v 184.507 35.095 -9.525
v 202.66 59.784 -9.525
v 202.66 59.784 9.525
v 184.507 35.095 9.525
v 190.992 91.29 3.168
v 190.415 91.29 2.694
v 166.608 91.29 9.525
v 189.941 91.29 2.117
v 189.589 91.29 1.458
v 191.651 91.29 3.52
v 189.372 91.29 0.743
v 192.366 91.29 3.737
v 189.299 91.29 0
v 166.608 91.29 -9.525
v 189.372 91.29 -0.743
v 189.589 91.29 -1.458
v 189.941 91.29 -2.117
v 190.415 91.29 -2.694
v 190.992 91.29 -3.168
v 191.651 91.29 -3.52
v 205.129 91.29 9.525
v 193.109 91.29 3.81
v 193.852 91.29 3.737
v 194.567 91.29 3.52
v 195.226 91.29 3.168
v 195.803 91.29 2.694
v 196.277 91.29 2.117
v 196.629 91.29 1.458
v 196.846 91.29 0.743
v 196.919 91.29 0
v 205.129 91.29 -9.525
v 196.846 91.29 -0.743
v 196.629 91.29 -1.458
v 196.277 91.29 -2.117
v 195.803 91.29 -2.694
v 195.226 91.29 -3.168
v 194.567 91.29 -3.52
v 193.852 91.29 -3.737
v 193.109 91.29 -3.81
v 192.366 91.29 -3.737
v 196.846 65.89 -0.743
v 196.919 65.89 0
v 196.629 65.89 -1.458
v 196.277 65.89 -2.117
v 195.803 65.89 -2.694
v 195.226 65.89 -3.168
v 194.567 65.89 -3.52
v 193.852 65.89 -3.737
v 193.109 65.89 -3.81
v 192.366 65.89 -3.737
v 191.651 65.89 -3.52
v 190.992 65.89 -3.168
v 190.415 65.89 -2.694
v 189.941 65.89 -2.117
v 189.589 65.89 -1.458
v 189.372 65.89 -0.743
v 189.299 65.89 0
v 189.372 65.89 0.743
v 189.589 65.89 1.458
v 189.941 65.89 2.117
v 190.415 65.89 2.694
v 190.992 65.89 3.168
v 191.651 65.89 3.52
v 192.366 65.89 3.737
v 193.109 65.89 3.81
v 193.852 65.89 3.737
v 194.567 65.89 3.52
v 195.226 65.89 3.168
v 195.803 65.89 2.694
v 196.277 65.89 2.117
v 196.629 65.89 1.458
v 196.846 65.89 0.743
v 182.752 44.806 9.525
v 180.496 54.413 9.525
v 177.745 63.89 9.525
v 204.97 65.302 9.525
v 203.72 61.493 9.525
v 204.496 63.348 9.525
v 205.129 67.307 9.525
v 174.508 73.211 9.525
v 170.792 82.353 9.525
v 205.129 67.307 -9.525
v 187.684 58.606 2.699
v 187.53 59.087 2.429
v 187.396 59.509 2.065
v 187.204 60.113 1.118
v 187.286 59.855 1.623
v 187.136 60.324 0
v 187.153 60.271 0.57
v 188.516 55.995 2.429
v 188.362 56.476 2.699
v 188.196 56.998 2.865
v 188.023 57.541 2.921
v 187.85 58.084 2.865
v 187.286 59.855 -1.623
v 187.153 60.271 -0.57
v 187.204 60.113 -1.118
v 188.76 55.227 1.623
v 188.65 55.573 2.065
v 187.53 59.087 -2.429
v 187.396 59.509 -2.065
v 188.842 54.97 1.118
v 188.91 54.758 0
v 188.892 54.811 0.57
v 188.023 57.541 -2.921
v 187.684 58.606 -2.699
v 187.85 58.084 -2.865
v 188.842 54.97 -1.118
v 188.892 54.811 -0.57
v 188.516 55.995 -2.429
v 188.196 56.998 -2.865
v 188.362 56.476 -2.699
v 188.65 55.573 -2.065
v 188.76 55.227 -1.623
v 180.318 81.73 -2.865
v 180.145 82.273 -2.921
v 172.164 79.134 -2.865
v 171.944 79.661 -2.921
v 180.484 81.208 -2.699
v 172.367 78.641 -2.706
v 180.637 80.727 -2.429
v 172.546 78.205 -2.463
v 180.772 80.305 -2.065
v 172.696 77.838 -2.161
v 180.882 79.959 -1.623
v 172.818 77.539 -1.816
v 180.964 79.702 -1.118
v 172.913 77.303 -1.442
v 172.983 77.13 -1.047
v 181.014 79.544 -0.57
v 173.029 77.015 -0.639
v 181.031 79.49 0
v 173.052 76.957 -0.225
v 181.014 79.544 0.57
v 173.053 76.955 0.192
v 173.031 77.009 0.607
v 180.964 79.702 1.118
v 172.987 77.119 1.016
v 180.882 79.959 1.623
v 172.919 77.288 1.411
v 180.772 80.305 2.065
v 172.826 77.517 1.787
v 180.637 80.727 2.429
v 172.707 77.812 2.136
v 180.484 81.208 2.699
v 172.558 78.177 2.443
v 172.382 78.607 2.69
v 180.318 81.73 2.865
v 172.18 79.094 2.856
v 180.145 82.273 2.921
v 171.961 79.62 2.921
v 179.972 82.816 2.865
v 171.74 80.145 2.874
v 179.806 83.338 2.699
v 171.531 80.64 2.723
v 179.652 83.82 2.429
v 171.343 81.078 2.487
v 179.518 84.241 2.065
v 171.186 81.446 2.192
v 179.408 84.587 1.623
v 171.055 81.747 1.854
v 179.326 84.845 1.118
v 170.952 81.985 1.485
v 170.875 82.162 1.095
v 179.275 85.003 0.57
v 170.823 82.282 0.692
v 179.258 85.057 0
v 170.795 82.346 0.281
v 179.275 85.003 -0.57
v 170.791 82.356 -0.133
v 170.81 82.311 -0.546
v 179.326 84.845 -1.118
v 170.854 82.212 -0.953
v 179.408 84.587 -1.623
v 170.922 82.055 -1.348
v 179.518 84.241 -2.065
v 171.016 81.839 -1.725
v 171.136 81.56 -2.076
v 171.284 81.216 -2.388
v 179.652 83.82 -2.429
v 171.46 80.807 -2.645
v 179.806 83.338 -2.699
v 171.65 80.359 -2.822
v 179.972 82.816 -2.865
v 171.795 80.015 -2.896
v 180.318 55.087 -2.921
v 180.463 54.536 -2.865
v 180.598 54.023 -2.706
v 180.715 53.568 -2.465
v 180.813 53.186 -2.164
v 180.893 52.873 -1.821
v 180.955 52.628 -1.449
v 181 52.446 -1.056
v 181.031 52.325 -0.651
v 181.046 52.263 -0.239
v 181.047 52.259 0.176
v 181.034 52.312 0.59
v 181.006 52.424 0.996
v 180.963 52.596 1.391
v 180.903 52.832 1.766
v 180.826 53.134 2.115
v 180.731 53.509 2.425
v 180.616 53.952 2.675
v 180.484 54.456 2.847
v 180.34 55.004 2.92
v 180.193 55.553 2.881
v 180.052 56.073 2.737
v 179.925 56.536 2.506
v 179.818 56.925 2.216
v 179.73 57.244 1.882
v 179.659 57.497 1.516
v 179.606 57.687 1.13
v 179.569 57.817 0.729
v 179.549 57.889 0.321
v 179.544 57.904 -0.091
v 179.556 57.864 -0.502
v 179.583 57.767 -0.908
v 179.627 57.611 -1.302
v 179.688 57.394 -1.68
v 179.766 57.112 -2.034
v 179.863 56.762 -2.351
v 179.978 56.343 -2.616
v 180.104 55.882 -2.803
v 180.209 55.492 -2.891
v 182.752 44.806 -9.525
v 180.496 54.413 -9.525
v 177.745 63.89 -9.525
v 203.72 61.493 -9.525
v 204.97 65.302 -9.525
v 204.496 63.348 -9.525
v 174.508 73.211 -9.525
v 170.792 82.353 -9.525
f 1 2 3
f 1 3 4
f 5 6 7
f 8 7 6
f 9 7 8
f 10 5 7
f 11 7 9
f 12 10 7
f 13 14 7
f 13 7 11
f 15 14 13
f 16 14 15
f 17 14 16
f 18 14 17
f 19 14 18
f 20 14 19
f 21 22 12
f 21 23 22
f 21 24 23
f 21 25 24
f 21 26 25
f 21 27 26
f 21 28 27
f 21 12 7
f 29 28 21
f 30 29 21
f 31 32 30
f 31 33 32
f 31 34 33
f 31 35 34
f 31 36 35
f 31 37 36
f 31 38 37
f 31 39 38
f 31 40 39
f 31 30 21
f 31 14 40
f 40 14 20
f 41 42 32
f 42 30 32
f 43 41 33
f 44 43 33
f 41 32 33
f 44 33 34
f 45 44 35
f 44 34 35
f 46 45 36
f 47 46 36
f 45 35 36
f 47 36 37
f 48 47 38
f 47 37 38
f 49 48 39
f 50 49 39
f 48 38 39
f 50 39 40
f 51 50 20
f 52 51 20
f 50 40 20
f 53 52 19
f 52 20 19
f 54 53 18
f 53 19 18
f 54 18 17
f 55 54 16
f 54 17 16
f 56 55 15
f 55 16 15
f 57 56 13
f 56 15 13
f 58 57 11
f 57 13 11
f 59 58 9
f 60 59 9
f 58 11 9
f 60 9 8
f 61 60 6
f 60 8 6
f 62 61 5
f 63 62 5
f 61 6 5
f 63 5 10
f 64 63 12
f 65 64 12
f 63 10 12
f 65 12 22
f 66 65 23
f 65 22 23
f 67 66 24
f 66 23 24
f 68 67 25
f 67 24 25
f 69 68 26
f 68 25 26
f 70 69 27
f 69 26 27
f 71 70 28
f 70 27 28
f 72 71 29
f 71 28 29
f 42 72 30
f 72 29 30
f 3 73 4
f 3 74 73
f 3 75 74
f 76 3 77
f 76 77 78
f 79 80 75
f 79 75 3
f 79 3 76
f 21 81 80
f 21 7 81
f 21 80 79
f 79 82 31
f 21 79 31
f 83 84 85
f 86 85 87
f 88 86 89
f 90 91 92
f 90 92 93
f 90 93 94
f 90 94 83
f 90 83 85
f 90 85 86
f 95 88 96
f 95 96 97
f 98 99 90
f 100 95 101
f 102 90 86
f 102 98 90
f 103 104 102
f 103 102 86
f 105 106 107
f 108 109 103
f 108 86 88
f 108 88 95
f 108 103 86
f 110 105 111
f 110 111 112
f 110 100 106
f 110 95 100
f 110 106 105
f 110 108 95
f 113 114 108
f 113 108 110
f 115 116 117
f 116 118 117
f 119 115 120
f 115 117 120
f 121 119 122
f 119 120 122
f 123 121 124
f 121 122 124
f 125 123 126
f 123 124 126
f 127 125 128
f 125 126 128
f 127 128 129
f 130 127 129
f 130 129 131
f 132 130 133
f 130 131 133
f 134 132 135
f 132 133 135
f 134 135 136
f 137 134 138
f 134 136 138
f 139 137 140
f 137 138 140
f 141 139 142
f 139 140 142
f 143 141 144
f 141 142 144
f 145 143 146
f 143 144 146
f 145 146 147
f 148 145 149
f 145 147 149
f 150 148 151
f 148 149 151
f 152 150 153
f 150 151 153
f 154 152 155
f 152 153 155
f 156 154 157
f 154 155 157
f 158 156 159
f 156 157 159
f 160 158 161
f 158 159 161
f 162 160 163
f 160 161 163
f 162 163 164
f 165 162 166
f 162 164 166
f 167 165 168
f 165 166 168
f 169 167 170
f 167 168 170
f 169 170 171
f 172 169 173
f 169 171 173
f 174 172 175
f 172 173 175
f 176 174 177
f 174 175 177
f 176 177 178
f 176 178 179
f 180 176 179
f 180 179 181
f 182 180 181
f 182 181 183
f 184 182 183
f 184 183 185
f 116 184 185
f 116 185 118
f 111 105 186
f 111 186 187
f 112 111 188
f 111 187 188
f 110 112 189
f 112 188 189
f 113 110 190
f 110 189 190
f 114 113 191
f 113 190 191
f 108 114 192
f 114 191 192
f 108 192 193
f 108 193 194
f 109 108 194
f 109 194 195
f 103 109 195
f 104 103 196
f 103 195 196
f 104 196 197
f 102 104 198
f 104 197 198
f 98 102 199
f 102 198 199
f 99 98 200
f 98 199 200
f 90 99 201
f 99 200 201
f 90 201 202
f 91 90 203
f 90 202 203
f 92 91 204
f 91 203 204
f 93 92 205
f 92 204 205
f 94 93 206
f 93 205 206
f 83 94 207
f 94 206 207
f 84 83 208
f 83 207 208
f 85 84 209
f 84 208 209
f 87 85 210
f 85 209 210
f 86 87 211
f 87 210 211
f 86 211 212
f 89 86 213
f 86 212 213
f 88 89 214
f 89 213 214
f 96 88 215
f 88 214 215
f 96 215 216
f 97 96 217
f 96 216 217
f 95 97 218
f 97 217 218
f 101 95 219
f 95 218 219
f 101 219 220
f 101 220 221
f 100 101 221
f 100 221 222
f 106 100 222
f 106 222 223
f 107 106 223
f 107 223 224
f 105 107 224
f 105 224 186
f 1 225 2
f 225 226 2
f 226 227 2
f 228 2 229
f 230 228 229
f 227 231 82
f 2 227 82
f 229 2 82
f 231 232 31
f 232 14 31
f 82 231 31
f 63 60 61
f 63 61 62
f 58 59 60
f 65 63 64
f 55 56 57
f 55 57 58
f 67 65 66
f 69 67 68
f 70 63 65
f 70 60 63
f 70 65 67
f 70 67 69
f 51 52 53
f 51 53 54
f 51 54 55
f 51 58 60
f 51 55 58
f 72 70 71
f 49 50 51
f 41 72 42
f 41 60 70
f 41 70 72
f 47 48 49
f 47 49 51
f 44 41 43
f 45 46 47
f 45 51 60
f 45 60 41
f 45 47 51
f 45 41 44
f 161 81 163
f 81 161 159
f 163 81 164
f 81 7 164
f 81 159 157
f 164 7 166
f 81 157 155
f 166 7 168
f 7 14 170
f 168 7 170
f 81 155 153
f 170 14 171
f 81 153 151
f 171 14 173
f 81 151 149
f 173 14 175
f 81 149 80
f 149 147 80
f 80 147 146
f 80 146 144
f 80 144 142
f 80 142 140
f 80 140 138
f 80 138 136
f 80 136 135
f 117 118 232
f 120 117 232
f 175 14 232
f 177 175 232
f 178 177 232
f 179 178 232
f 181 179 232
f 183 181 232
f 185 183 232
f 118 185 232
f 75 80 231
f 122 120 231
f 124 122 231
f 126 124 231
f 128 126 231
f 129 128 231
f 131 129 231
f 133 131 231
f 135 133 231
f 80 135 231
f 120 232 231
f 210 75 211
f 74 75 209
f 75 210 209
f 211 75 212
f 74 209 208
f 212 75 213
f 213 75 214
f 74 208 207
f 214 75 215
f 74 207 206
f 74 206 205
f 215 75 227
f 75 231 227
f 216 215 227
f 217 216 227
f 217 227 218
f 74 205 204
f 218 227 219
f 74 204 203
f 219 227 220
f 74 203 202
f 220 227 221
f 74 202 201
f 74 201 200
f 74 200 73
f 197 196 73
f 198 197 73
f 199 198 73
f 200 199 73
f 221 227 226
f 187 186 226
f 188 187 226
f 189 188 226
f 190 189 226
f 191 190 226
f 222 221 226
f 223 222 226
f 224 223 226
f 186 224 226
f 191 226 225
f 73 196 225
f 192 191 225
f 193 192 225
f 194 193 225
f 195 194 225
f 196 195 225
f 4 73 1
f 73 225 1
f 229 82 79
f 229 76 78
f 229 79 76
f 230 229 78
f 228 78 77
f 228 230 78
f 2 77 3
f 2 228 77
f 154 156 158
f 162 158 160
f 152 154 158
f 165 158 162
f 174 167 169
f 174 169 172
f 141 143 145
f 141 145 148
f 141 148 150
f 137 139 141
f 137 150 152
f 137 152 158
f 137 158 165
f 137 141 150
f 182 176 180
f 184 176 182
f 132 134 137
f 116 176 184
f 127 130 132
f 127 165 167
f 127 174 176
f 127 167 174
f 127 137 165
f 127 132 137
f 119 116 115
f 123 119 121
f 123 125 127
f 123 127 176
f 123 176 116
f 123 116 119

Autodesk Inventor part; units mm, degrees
ref_plane "YZ Plane" through (0, 0, 0) normal (1, 0, 0) x (0, 1, 0)
ref_plane "XZ Plane" through (0, 0, 0) normal (0, 1, 0) x (-1, 0, 0)
ref_plane "XY Plane" through (0, 0, 0) normal (0, 0, 1) x (1, 0, 0)
sketch "Sketch1" plane through (0, 0, 0) normal (0, 0, 1) x (1, 0, 0)
  arc A0 (184.5073, 35.0953) -> (33.1465, 192.9611) centre (-3.7688, 6.072) ccw construction
  arc A1 (184.5073, 35.0953) -> (166.6077, 91.29) centre (-3.7688, 6.072) ccw
  line L0 (202.6605, 59.7837) -> (184.5073, 35.0953)
  arc A2 (202.6605, 59.7837) -> (205.1287, 67.3071) centre (192.4287, 67.3071) ccw
  line L1 (166.6077, 91.29) -> (205.1287, 91.29)
  line L2 (205.1287, 67.3071) -> (205.1287, 91.29)
  point P0 (0, 0)
  dimension "d3" = 12.7
extrude "Extrusion1" add sketch "Sketch1" along normal mid plane 19.05
sketch "Sketch2" plane through (166.6077, 91.29, 9.525) normal (0, 1, 0) x (1, 0, 0)
  circle A0 centre (26.5011, 9.525) radius 3.81
  line L0 (38.5211, 0) -> (38.5211, 19.05) construction
  ellipse E0 centre (26.5011, 5.9613) end of major axis (22.6972, 5.7462) minor radius 3.81 construction
  ellipse E1 centre (26.5011, 5.9613) end of major axis (22.6972, 5.7462) minor radius 3.81 construction
  point P0 (-166.6077, 9.525)
  point P1 (38.5211, 9.525)
  dimension "d6" = 7.62
extrude "Extrusion2" cut sketch "Sketch2" against normal blind 25.4
ref_plane "Work Plane1" through (166.6077, 91.29, 9.525) normal (-0.9528, -0.3035, 0) x (0, 0, -1)
sketch "Sketch3" plane through (166.6077, 91.29, 9.525) normal (-0.9528, -0.3035, 0) x (0, 0, -1)
  circle A0 centre (9.525, 12.7) radius 2.921
  line L0 (0, 0) -> (19.05, 0) construction
  circle A1 centre (9.525, 38.6566) radius 2.921
  line L1 (19.05, 58.9766) -> (0, 58.9766) projected
  point P0 (9.525, 36.4178)
  point P1 (9.525, 0)
  point P2 (9.525, 0)
  dimension "d9" = 5.842
  dimension "d10" = 12.7
  dimension "d11" = 5.842
  dimension "d12" = 20.32
extrude "Extrusion3" cut sketch "Sketch3" against normal blind 10.16
ref_plane "Work Plane2" through (0, 0, 0) normal (0, 0, 1) x (1, 0, 0)
sketch "Sketch4" plane through (0, 0, 0) normal (0, 0, 1) x (1, 0, 0)
  point P0 (0, 0)
equation "\"d11\" = d9"
properties part number "light_mount"
